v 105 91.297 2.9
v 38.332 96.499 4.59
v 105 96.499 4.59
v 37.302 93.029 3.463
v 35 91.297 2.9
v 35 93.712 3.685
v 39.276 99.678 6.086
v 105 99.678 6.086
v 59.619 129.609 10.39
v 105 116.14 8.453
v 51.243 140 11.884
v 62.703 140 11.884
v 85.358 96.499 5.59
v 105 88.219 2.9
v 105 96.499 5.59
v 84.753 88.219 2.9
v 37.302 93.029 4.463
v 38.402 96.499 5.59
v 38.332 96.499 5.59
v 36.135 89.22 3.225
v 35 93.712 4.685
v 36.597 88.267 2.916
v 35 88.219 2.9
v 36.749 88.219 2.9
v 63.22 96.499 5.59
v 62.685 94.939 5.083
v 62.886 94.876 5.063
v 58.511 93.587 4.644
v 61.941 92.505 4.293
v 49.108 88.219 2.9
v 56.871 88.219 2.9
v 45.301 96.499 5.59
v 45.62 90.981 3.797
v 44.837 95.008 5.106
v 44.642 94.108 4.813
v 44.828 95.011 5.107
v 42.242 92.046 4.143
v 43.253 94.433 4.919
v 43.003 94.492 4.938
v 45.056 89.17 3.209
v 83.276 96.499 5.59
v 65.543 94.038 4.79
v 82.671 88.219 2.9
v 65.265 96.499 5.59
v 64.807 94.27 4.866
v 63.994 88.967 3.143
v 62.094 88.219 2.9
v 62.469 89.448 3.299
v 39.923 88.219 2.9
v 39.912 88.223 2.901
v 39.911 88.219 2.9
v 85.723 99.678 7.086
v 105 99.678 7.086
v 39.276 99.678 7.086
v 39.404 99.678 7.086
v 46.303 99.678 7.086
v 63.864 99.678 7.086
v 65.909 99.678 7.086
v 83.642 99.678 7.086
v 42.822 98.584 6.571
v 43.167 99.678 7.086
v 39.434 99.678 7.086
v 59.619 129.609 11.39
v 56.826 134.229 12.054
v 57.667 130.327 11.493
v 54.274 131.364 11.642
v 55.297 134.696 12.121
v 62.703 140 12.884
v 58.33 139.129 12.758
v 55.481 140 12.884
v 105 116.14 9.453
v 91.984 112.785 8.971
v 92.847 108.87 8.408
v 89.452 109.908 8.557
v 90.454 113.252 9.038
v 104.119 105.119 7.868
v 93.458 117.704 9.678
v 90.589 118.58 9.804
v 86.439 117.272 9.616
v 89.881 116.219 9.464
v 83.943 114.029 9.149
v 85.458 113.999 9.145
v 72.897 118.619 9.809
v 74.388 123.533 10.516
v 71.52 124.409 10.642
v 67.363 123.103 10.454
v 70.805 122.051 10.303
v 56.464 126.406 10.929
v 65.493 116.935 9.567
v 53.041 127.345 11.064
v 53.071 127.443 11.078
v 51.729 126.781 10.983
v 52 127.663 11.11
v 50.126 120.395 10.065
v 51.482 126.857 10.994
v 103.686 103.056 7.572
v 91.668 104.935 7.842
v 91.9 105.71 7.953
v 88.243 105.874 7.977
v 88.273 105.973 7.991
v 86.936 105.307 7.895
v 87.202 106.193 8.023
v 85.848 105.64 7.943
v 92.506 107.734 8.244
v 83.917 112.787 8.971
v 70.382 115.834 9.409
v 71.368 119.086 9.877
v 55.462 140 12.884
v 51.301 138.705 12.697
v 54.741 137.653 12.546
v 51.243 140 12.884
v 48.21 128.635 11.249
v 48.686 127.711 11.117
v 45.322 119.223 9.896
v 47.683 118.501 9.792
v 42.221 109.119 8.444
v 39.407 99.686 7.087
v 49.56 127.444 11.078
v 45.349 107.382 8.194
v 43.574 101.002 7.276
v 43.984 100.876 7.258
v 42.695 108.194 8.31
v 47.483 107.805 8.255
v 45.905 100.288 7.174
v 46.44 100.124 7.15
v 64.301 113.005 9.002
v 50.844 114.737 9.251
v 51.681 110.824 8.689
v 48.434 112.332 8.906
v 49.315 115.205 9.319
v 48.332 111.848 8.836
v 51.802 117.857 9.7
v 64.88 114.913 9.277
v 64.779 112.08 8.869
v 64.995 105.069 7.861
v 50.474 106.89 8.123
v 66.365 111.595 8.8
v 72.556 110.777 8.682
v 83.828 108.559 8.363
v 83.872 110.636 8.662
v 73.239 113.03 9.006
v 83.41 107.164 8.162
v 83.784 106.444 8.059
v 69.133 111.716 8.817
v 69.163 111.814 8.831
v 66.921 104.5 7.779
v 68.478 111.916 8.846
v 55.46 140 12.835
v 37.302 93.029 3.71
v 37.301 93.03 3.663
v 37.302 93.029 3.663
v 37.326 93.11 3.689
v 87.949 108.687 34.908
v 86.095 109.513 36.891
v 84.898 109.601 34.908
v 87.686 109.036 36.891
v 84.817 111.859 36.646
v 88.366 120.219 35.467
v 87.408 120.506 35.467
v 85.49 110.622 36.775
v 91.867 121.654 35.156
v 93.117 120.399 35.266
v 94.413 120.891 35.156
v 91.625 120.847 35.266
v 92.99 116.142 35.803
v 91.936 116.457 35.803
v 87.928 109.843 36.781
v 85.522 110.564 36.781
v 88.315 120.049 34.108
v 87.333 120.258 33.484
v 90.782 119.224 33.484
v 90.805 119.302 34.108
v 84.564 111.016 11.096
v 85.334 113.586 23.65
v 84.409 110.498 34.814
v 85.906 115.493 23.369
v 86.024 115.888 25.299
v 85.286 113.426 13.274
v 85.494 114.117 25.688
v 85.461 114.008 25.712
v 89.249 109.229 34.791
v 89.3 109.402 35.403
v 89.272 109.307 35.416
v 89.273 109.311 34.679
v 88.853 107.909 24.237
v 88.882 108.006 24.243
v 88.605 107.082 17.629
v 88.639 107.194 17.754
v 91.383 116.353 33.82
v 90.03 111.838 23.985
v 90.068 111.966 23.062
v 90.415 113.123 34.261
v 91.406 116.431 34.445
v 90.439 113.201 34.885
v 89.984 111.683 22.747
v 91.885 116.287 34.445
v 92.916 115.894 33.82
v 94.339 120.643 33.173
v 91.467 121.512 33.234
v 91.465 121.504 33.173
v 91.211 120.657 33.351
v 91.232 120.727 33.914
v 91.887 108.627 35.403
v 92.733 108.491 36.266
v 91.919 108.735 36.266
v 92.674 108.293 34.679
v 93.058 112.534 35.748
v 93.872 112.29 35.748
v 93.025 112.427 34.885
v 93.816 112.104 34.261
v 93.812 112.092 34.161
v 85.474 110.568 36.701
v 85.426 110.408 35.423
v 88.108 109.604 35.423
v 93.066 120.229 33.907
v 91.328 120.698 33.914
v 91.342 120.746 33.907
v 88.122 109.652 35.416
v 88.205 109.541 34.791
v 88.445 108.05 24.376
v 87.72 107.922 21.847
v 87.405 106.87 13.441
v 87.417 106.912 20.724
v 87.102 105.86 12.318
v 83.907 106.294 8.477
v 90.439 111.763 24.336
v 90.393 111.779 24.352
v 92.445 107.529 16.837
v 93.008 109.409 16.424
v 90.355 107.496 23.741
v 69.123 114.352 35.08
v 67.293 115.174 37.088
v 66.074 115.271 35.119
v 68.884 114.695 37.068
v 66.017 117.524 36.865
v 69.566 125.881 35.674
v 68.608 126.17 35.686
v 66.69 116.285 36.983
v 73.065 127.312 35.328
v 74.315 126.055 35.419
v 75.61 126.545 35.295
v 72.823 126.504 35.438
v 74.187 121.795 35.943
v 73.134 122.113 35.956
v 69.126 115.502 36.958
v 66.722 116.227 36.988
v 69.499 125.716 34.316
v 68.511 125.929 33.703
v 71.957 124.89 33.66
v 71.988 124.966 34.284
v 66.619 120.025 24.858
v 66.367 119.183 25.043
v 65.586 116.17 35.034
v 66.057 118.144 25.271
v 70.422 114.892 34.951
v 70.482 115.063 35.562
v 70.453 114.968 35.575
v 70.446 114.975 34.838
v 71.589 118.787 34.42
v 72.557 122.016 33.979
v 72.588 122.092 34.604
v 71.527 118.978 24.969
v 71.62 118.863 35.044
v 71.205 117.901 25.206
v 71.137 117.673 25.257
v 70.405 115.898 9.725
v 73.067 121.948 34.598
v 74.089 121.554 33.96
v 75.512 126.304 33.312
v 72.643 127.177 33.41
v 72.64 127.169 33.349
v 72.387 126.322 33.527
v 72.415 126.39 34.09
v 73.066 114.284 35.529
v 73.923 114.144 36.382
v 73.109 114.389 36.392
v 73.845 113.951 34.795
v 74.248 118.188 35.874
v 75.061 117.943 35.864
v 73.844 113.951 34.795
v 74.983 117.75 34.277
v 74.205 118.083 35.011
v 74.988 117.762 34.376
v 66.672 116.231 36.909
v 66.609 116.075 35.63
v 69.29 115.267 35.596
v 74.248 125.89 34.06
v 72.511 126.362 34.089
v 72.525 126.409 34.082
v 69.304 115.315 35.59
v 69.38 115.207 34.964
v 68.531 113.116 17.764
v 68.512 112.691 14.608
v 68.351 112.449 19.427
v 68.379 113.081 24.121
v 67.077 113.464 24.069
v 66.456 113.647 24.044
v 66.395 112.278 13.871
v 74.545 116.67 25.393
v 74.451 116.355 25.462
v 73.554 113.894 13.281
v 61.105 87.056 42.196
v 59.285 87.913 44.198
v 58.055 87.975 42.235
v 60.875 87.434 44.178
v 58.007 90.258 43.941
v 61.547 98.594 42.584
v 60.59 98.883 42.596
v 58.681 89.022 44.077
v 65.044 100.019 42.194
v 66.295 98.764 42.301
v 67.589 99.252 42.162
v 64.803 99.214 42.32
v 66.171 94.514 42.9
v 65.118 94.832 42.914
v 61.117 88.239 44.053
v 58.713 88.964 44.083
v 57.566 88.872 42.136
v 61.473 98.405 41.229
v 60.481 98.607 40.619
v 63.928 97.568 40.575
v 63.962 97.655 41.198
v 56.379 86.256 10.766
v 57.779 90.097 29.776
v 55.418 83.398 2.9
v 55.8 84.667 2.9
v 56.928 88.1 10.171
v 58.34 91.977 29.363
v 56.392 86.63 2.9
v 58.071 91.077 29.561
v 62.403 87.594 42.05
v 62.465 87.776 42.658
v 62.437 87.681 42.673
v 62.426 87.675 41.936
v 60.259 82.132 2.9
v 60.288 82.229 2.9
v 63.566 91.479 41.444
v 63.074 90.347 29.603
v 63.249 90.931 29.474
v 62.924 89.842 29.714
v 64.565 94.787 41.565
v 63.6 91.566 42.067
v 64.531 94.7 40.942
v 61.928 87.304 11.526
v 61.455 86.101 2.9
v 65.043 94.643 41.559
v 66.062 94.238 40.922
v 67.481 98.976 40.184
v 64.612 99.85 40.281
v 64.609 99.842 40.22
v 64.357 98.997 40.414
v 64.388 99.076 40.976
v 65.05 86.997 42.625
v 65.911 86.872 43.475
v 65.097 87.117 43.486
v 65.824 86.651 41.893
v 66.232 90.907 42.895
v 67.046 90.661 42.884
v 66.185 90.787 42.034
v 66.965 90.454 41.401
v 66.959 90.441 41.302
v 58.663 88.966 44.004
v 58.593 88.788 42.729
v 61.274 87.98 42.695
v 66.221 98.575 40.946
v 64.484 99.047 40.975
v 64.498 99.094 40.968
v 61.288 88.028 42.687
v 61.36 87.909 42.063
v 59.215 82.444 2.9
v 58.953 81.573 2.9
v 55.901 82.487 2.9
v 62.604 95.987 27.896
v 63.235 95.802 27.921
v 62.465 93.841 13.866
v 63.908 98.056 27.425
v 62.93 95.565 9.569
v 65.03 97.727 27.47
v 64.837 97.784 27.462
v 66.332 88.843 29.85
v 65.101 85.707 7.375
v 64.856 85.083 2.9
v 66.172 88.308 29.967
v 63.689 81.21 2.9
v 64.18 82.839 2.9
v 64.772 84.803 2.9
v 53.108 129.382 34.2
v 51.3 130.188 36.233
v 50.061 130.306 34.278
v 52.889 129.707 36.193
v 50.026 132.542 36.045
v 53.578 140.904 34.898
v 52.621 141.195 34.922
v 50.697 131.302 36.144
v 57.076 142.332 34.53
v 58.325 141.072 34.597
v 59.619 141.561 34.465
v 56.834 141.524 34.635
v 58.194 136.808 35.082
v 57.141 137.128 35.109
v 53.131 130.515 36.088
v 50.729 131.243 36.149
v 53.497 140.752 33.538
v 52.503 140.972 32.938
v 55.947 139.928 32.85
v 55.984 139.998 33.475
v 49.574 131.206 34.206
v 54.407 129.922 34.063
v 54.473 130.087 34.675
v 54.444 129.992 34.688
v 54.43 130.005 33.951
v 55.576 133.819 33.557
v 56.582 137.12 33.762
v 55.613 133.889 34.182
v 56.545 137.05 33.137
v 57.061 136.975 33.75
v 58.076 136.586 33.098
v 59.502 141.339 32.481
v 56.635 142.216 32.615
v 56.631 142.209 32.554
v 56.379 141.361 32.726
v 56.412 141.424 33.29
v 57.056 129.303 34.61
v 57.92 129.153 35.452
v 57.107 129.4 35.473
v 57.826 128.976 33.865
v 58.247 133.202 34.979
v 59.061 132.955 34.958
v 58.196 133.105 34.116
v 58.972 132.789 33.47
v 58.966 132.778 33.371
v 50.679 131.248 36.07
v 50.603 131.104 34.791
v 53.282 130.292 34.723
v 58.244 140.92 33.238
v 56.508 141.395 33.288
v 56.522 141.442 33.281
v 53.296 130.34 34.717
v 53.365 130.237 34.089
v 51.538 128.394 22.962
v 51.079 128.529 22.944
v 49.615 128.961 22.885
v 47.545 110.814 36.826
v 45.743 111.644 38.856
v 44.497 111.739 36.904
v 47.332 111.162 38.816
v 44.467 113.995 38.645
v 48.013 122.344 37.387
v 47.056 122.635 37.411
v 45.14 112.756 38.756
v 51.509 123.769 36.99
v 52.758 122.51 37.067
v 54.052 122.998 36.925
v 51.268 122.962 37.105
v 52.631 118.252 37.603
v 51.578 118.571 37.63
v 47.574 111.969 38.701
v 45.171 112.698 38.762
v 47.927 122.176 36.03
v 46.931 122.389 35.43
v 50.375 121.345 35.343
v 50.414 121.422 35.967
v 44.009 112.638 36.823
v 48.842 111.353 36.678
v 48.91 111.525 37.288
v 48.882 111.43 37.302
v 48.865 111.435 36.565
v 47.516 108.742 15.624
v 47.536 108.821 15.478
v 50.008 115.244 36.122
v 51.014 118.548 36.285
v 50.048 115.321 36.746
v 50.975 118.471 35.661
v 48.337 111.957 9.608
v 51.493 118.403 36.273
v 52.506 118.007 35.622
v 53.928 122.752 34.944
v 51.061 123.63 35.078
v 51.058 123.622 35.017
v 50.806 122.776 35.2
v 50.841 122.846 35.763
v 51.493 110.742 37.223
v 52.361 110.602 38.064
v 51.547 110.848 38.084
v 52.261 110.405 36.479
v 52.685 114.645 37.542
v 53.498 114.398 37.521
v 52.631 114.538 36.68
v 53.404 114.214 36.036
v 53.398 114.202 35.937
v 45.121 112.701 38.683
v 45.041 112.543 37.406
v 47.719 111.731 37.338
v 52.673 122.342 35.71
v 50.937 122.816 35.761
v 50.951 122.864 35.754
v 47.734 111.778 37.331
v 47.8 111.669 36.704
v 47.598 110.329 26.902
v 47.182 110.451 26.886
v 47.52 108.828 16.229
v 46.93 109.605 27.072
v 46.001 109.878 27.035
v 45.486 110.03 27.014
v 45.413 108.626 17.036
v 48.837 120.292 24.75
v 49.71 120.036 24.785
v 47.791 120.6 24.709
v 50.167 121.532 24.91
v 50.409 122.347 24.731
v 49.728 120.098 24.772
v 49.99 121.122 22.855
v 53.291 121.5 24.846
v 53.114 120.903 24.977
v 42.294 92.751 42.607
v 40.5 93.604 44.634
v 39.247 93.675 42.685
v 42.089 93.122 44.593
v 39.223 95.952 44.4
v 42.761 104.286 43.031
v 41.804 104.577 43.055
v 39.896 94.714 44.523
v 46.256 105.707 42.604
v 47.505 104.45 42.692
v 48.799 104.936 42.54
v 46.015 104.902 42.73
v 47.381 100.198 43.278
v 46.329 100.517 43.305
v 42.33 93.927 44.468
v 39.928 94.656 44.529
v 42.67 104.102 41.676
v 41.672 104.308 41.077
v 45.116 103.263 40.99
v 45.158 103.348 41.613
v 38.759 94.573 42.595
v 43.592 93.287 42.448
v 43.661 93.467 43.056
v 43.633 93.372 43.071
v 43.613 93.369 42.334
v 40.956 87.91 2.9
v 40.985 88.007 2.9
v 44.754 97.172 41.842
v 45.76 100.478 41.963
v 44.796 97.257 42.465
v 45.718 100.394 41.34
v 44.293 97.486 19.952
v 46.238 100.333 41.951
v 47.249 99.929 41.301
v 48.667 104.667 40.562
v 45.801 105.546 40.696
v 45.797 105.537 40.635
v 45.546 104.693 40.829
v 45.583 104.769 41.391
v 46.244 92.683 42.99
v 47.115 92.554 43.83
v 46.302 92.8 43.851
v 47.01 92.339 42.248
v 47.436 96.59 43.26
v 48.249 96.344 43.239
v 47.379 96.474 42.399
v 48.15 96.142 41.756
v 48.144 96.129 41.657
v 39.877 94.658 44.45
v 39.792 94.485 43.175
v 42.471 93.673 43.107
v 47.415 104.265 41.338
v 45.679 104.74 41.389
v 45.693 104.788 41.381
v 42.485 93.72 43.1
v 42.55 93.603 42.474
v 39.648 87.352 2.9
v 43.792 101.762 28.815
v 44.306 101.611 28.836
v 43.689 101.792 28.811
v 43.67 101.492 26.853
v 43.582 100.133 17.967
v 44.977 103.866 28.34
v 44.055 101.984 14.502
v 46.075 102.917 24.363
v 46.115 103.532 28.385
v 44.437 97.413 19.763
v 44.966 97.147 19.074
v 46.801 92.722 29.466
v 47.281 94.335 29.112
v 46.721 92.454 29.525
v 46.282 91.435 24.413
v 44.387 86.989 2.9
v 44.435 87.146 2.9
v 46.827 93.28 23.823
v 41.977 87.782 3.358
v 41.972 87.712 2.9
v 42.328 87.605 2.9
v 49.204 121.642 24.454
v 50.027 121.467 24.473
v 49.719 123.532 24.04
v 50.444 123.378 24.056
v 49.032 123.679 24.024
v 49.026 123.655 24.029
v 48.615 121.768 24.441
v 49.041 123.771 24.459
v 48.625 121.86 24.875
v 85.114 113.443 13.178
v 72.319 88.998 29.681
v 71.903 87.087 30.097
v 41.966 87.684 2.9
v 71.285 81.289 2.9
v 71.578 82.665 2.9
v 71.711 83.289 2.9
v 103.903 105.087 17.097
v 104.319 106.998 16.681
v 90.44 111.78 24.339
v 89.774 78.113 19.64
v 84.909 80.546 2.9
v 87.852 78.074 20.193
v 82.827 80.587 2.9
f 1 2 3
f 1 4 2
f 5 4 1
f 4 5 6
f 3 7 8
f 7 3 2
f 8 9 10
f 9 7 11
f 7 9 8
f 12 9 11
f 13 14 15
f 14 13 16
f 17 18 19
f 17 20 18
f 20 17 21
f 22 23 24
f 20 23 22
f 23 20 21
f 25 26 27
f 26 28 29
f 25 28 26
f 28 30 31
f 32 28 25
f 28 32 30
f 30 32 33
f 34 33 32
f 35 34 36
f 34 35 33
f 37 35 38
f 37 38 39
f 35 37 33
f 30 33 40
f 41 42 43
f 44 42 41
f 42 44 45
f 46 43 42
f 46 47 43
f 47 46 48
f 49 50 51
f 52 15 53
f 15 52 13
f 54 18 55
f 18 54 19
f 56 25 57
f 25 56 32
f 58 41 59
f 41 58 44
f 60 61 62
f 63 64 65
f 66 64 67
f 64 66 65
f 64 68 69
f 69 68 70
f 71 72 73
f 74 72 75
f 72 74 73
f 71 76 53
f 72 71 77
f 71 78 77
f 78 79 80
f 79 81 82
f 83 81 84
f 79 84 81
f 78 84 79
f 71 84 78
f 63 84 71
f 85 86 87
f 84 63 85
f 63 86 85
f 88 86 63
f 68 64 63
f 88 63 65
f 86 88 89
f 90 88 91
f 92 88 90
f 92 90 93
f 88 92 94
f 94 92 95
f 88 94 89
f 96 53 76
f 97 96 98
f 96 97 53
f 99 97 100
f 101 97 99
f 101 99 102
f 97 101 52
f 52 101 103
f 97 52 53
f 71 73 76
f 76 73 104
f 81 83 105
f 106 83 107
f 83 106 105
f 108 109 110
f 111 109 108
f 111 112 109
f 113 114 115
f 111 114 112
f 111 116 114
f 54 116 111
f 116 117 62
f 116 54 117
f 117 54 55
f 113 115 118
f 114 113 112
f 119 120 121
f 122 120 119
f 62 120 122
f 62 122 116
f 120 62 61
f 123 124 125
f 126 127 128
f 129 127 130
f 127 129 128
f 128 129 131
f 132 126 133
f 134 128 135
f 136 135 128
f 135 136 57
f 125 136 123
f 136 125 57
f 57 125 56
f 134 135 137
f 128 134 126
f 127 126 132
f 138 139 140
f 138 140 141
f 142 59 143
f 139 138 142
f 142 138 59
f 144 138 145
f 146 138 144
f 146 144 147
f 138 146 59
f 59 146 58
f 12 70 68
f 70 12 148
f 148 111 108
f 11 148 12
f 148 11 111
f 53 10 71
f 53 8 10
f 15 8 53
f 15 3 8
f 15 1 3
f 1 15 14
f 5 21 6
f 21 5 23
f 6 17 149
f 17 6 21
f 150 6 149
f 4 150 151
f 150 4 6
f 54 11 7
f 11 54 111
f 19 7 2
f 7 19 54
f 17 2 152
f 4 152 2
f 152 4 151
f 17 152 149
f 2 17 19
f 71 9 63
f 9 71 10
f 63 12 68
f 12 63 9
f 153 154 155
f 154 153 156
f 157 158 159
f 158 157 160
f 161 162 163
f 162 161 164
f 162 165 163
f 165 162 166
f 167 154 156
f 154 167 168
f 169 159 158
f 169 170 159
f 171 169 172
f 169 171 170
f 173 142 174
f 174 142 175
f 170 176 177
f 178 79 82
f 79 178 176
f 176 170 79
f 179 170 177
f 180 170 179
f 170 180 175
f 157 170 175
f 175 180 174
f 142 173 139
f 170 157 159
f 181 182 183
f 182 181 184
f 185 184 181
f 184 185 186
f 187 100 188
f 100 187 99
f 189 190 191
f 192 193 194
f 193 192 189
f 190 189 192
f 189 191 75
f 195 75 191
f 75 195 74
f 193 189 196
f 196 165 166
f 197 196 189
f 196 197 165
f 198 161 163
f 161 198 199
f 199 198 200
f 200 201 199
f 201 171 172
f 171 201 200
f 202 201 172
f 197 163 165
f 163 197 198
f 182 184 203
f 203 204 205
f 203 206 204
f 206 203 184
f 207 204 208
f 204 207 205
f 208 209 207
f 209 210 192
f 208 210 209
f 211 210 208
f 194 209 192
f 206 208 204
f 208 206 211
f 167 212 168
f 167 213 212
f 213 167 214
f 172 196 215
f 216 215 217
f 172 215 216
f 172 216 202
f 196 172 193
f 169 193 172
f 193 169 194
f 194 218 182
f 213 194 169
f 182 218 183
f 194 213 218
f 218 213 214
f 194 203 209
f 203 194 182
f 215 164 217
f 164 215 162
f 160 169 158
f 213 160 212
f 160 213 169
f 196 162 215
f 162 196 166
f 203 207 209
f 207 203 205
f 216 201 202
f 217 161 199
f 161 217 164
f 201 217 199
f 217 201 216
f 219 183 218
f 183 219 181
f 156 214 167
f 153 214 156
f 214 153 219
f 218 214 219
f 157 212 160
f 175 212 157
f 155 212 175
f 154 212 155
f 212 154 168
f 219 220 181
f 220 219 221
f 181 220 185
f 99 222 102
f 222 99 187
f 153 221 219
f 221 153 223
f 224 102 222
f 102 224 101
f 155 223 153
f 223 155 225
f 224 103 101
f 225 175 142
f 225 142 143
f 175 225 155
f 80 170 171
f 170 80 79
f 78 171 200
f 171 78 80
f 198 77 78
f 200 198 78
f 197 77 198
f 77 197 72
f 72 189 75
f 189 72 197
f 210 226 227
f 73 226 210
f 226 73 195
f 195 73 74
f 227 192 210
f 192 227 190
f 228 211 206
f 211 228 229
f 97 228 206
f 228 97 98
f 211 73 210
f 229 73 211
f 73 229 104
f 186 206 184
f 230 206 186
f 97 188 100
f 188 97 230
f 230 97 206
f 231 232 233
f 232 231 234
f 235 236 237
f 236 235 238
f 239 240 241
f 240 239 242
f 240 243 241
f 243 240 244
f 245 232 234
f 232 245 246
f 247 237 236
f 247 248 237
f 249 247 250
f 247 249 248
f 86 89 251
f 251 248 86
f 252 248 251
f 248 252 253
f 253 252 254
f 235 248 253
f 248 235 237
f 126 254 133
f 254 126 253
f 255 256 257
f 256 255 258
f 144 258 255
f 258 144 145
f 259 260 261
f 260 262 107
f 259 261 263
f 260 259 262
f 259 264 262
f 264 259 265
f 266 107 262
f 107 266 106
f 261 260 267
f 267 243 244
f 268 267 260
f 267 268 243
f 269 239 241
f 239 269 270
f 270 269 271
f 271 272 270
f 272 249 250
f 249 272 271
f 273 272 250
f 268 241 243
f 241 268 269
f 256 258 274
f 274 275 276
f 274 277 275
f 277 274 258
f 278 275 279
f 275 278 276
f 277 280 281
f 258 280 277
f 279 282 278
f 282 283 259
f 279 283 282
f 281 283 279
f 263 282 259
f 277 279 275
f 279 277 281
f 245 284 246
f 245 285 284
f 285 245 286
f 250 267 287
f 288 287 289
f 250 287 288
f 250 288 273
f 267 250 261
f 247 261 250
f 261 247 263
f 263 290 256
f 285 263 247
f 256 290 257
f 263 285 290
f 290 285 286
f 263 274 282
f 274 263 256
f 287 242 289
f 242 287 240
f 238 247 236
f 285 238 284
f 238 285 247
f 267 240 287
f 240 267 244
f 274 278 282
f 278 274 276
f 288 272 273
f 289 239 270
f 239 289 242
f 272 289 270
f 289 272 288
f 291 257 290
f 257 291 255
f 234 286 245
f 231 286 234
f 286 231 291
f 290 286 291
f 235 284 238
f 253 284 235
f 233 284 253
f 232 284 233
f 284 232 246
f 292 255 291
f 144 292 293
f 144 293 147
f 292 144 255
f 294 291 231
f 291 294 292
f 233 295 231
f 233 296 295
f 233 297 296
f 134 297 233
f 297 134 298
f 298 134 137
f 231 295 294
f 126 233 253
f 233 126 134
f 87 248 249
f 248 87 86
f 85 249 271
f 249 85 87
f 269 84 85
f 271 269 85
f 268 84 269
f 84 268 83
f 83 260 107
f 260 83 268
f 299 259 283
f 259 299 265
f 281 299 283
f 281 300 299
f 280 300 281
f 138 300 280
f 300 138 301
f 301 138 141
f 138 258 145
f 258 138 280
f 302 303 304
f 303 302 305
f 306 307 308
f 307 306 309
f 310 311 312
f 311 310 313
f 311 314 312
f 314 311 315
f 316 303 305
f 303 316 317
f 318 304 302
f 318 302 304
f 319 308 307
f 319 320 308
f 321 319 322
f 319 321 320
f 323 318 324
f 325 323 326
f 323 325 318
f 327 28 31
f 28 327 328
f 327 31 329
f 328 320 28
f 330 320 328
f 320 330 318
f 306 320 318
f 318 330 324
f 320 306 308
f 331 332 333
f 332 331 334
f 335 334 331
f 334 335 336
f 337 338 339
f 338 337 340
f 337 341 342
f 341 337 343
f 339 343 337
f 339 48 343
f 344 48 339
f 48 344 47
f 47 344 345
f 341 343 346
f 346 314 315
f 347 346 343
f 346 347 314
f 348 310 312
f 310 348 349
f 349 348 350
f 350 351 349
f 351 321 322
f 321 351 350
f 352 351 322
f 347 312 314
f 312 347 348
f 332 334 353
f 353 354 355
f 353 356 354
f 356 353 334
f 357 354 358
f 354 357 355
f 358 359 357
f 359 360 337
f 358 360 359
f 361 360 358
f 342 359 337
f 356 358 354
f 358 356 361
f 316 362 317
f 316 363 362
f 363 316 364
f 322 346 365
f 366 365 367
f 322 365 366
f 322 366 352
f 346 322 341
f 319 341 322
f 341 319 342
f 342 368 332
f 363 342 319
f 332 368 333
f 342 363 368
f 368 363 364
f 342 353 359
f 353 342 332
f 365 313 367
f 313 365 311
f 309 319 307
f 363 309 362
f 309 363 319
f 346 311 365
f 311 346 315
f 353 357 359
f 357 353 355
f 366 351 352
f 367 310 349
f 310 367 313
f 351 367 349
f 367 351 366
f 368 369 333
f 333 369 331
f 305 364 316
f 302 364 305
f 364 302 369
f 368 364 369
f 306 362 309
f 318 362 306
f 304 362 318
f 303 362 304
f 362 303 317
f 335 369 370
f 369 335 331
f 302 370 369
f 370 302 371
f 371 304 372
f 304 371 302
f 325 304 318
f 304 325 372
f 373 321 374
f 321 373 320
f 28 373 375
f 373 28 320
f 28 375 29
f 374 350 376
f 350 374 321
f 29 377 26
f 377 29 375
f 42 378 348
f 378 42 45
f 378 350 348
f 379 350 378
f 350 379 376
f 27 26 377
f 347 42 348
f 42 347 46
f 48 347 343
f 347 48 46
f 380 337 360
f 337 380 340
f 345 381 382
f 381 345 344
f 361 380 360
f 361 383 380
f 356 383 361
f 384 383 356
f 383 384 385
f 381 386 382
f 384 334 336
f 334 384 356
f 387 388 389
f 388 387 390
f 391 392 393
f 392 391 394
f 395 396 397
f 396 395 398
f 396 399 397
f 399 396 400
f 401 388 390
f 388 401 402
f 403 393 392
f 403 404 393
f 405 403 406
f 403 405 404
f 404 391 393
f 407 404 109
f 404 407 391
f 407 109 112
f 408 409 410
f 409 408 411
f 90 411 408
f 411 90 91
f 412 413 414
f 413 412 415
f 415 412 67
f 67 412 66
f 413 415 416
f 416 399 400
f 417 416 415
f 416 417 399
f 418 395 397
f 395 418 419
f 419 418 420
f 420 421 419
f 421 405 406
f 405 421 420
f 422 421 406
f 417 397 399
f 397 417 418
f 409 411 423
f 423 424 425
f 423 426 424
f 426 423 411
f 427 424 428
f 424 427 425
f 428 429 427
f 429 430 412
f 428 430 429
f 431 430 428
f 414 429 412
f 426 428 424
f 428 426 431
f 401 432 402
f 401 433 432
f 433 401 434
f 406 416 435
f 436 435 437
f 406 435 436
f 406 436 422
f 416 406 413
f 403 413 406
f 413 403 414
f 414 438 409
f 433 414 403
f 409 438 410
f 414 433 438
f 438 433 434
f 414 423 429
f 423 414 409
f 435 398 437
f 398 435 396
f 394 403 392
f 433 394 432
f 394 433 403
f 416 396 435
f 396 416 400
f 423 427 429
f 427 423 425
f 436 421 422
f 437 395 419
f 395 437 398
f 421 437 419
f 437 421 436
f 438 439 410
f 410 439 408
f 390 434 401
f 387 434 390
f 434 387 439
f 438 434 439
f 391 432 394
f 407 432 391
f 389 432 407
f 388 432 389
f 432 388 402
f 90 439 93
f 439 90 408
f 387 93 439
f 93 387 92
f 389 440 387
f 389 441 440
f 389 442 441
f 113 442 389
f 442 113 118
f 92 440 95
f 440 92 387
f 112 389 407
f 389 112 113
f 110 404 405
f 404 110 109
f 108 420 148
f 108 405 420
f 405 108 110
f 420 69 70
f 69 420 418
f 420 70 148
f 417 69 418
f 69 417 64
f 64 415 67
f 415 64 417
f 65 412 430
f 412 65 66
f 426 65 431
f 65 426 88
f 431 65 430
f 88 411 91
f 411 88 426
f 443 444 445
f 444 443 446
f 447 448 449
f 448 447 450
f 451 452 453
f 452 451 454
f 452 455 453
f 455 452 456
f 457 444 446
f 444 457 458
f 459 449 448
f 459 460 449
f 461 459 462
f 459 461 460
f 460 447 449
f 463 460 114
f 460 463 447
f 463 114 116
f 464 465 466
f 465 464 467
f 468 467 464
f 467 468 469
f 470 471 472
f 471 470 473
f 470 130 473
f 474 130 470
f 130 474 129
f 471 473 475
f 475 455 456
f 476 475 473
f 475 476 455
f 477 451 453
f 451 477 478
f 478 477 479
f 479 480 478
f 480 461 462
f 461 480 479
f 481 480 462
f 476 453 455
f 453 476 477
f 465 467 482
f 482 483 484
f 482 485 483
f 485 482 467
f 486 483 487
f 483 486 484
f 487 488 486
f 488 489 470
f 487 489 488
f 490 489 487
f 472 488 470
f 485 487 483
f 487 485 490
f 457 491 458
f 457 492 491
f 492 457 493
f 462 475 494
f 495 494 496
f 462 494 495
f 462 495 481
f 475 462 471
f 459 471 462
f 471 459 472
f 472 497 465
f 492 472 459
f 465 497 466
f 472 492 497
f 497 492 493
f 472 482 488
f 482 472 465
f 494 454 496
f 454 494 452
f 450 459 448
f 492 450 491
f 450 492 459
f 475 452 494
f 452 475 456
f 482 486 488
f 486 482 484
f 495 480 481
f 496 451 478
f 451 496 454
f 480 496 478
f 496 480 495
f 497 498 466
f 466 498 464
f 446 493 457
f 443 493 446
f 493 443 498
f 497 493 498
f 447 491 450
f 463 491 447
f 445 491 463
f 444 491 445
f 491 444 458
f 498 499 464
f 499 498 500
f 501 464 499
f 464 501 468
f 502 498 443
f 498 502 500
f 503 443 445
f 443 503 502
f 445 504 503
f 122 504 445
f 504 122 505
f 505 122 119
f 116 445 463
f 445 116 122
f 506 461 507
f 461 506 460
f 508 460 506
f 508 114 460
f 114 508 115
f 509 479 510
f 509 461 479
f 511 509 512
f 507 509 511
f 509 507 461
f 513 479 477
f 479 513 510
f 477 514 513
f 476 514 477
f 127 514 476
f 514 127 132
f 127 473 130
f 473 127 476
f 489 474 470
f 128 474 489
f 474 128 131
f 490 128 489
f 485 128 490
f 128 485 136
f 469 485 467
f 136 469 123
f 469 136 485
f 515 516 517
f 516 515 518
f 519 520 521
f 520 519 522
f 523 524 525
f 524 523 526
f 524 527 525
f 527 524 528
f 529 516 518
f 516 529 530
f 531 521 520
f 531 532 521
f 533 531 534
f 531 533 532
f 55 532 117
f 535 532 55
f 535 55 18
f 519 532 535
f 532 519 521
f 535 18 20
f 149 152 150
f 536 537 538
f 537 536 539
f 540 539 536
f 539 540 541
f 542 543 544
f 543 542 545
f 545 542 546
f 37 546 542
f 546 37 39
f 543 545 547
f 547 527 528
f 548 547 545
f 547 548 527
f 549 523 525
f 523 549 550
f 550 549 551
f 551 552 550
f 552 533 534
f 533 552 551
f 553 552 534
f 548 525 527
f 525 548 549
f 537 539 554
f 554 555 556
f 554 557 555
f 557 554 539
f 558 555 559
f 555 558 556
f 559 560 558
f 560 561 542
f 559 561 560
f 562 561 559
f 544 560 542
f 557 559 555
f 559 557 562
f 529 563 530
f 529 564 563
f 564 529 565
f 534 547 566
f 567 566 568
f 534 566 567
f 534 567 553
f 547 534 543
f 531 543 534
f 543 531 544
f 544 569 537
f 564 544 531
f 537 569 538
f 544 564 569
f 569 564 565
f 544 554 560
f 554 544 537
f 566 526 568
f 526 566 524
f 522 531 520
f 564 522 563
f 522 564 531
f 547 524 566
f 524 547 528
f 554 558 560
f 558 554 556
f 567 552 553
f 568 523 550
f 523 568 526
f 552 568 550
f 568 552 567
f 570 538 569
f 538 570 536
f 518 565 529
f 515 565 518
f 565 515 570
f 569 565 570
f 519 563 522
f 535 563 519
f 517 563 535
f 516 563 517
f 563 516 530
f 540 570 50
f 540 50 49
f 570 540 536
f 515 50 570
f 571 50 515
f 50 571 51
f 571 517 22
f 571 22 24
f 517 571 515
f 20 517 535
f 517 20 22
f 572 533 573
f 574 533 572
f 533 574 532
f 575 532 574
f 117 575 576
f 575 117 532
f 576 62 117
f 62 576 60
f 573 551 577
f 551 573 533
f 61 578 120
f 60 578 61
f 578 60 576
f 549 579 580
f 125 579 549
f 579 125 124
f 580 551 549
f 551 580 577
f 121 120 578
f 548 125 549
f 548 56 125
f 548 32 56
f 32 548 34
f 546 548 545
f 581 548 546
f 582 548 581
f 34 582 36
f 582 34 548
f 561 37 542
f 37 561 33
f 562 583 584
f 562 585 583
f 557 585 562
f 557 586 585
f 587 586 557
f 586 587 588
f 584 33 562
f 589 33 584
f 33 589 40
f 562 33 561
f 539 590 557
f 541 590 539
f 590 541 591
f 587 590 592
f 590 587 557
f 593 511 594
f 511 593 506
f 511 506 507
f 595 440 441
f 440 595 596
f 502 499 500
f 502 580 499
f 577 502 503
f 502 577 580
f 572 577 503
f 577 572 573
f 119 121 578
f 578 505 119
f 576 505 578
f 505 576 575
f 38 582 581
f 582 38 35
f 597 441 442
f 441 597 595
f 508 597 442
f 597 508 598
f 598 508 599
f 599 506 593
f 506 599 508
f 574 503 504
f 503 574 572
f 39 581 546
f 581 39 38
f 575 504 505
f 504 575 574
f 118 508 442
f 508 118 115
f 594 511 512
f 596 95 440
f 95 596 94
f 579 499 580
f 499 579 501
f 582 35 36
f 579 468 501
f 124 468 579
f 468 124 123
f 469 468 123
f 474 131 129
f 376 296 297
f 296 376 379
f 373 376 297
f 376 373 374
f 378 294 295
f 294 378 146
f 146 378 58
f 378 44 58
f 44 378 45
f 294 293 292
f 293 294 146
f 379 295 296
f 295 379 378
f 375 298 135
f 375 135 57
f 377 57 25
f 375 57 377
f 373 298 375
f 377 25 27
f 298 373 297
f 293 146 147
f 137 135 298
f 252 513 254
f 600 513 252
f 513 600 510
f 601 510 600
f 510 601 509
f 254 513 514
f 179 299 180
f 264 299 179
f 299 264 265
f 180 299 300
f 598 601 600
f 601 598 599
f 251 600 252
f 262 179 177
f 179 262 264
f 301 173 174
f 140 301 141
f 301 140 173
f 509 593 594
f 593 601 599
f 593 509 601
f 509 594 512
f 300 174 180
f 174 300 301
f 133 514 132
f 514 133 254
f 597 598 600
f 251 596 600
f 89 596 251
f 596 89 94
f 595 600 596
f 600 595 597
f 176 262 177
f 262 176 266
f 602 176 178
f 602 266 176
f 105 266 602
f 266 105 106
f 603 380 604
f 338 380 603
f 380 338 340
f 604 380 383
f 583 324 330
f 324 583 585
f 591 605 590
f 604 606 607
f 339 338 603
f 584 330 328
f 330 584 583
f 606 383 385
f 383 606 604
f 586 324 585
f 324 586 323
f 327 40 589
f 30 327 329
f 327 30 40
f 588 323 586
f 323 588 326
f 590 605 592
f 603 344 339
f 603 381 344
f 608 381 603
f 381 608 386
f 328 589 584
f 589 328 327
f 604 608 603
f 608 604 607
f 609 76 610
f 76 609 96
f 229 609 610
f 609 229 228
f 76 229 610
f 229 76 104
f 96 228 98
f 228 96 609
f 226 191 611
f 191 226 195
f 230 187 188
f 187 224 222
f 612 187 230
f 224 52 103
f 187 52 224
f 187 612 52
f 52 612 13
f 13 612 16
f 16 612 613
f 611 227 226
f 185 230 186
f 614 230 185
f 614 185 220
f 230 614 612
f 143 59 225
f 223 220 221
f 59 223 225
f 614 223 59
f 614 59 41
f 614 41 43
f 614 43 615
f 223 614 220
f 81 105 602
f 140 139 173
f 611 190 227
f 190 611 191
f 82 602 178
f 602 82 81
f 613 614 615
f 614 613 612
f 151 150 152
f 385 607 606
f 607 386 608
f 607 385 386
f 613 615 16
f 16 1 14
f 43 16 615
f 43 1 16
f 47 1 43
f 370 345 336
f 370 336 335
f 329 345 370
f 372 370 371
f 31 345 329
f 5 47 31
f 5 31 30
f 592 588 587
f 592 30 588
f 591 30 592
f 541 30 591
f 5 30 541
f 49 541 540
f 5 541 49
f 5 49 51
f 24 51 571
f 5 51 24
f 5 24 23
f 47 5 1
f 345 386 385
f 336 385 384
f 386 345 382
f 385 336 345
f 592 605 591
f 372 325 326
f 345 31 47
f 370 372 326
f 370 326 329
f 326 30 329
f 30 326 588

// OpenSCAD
difference () {
  union () {
    difference () {
      translate ([0, 0, 0.2]) {
        union () {
          difference () {
            translate ([0, 63, 89]) {
              rotate (a=90.0, v=[0, 1, 0]) {
                cylinder ($fn=50, h=416, r=91, center=true);
              }
            }
            intersection () {
              difference () {
                translate ([0, 63, 89]) {
                  rotate (a=90.0, v=[0, 1, 0]) {
                    cylinder ($fn=50, h=416, r=91, center=true);
                  }
                }
                translate ([0, 63, 89]) {
                  rotate (a=90.0, v=[0, 1, 0]) {
                    cylinder ($fn=50, h=416, r=90, center=true);
                  }
                }
              }
              translate ([195.25, 6, 22]) {
                cube ([26, 18, 31], center=true);
              }
            }
            translate ([0, 16, -70]) {
              rotate (a=90.0, v=[1, 0, 0]) {
                cylinder ($fn=50, h=32, r=112, center=true);
              }
            }
            translate ([203, 8, 9.8]) {
              cylinder (h=25, r=5.8, center=true);
            }
            translate ([0, 93, 0.5]) {
              cube ([416, 186, 2], center=true);
            }
            translate ([0, 1, 35]) {
              cube ([416, 2, 70], center=true);
            }
          }
          translate ([0, 130, 25.4]) {
            rotate (a=8.181818181818182, v=[1, 0, 0]) {
              cube ([416, 110, 30], center=true);
            }
          }
        }
      }
      translate ([0, 0, 1.2]) {
        union () {
          difference () {
            translate ([0, 63, 89]) {
              rotate (a=90.0, v=[0, 1, 0]) {
                cylinder ($fn=50, h=416, r=91, center=true);
              }
            }
            intersection () {
              difference () {
                translate ([0, 63, 89]) {
                  rotate (a=90.0, v=[0, 1, 0]) {
                    cylinder ($fn=50, h=416, r=91, center=true);
                  }
                }
                translate ([0, 63, 89]) {
                  rotate (a=90.0, v=[0, 1, 0]) {
                    cylinder ($fn=50, h=416, r=90, center=true);
                  }
                }
              }
              translate ([195.25, 6, 22]) {
                cube ([26, 18, 31], center=true);
              }
            }
            translate ([0, 16, -70]) {
              rotate (a=90.0, v=[1, 0, 0]) {
                cylinder ($fn=50, h=32, r=112, center=true);
              }
            }
            translate ([203, 8, 9.8]) {
              cylinder (h=25, r=5.8, center=true);
            }
            translate ([0, 93, 0.5]) {
              cube ([416, 186, 2], center=true);
            }
            translate ([0, 1, 35]) {
              cube ([416, 2, 70], center=true);
            }
          }
          translate ([0, 130, 25.4]) {
            rotate (a=8.181818181818182, v=[1, 0, 0]) {
              cube ([416, 110, 30], center=true);
            }
          }
        }
      }
      translate ([50, 0, 0]) {
        cube ([600, 150, 300], center=true);
      }
      translate ([50, 215, 0]) {
        cube ([600, 150, 300], center=true);
      }
      translate ([165, 100, 0]) {
        cube ([120, 200, 300], center=true);
      }
      translate ([-125, 100, 0]) {
        cube ([320, 200, 300], center=true);
      }
      translate ([50, 140, 50]) {
        cube ([30, 30, 30], center=true);
      }
      translate ([0, 0, -14]) {
        cube ([500, 500, 30], center=true);
      }
      translate ([37.21, 124.35, 28]) {
        rotate (a=73.46938775510203, v=[0, 0, 1]) {
          cube ([60, 18, 50], center=true);
        }
      }
      translate ([87, 134, 28]) {
        rotate (a=73.46938775510203, v=[0, 0, 1]) {
          cube ([24, 50, 50], center=true);
        }
      }
    }
    intersection () {
      union () {
        translate ([125, 58, 0]) {
          mirror ([0, 1, 0]) {
            rotate (a=3.0, v=[0, 1, 0]) {
              union () {
                translate ([-52, -53, 37]) {
                  rotate (a=7.499999999999999, v=[1, -0.1, 0]) {
                    rotate (a=16.875, v=[0, 0, 1]) {
                      translate ([17.4, 0, 0]) {
                        translate ([0, 0, 1597.5641385291783]) {
                          rotate (a=0.0, v=[0, 1, 0]) {
                            translate ([0, 0, -1597.5641385291783]) {
                              translate ([0, 0, 1516.0762963369527]) {
                                rotate (a=-0.3515625, v=[1, 0, 0]) {
                                  translate ([0, 0, -1516.0762963369527]) {
                                    rotate (a=90.0, v=[0, 0, 1]) {
                                      union () {
                                        difference () {
                                          union () {
                                            translate ([1.7, 5.75, -3.5]) {
                                              cube ([11, 5, 2], center=true);
                                            }
                                            translate ([-3.7, 3.15, -3.5]) {
                                              cube ([5, 3, 2], center=true);
                                            }
                                            translate ([4.2, 2.2, -3.8]) {
                                              cube ([4, 5, 1.6], center=true);
                                            }
                                          }
                                          union () {
                                            translate ([0.5, 5, -3.12]) {
                                              cube ([11.7, 4.5, 1.5], center=true);
                                            }
                                            translate ([4.2, 2.8, -3.12]) {
                                              cube ([4, 4.5, 1.5], center=true);
                                            }
                                          }
                                          translate ([-6.3, 5.5, -3.5]) {
                                            rotate (a=10.0, v=[1, 0, 0]) {
                                              cube ([2, 2, 10], center=true);
                                            }
                                          }
                                          translate ([7.3, 3.5, -3.5]) {
                                            rotate (a=10.0, v=[-1, 0, 0]) {
                                              cube ([2, 2, 10], center=true);
                                            }
                                          }
                                          translate ([8.1, 9.1, -3.5]) {
                                            rotate (a=22.5, v=[1, -1, 0]) {
                                              rotate (a=45.0, v=[0, 0, 1]) {
                                                cube ([4, 4, 10], center=true);
                                              }
                                            }
                                          }
                                        }
                                        translate ([0, 0, -54.5]) {
                                          linear_extrude (height=100, center=true){
                                            projection (cut = false) {
                                              difference () {
                                                union () {
                                                  translate ([1.7, 5.75, -3.5]) {
                                                    cube ([11, 5, 2], center=true);
                                                  }
                                                  translate ([-3.7, 3.15, -3.5]) {
                                                    cube ([5, 3, 2], center=true);
                                                  }
                                                  translate ([4.2, 2.2, -3.8]) {
                                                    cube ([4, 5, 1.6], center=true);
                                                  }
                                                }
                                                union () {
                                                  translate ([0.5, 5, -3.12]) {
                                                    cube ([11.7, 4.5, 1.5], center=true);
                                                  }
                                                  translate ([4.2, 2.8, -3.12]) {
                                                    cube ([4, 4.5, 1.5], center=true);
                                                  }
                                                }
                                                translate ([-6.3, 5.5, -3.5]) {
                                                  rotate (a=10.0, v=[1, 0, 0]) {
                                                    cube ([2, 2, 10], center=true);
                                                  }
                                                }
                                                translate ([7.3, 3.5, -3.5]) {
                                                  rotate (a=10.0, v=[-1, 0, 0]) {
                                                    cube ([2, 2, 10], center=true);
                                                  }
                                                }
                                                translate ([8.1, 9.1, -3.5]) {
                                                  rotate (a=22.5, v=[1, -1, 0]) {
                                                    rotate (a=45.0, v=[0, 0, 1]) {
                                                      cube ([4, 4, 10], center=true);
                                                    }
                                                  }
                                                }
                                              }
                                            }
                                          }
                                        }
                                      }
                                    }
                                  }
                                }
                              }
                            }
                          }
                        }
                      }
                    }
                  }
                }
                translate ([-52, -53, 37]) {
                  rotate (a=7.499999999999999, v=[1, -0.1, 0]) {
                    rotate (a=16.875, v=[0, 0, 1]) {
                      translate ([17.4, 0, 0]) {
                        translate ([0, 0, 1597.5641385291783]) {
                          rotate (a=0.703125, v=[0, 1, 0]) {
                            translate ([0, 0, -1597.5641385291783]) {
                              translate ([0, 0, 1516.0762963369527]) {
                                rotate (a=-0.3515625, v=[1, 0, 0]) {
                                  translate ([0, 0, -1516.0762963369527]) {
                                    rotate (a=90.0, v=[0, 0, 1]) {
                                      union () {
                                        difference () {
                                          union () {
                                            translate ([1.7, 5.75, -3.5]) {
                                              cube ([11, 5, 2], center=true);
                                            }
                                            translate ([-3.7, 3.15, -3.5]) {
                                              cube ([5, 3, 2], center=true);
                                            }
                                            translate ([4.2, 2.2, -3.8]) {
                                              cube ([4, 5, 1.6], center=true);
                                            }
                                          }
                                          union () {
                                            translate ([0.5, 5, -3.12]) {
                                              cube ([11.7, 4.5, 1.5], center=true);
                                            }
                                            translate ([4.2, 2.8, -3.12]) {
                                              cube ([4, 4.5, 1.5], center=true);
                                            }
                                          }
                                          translate ([-6.3, 5.5, -3.5]) {
                                            rotate (a=10.0, v=[1, 0, 0]) {
                                              cube ([2, 2, 10], center=true);
                                            }
                                          }
                                          translate ([7.3, 3.5, -3.5]) {
                                            rotate (a=10.0, v=[-1, 0, 0]) {
                                              cube ([2, 2, 10], center=true);
                                            }
                                          }
                                          translate ([8.1, 9.1, -3.5]) {
                                            rotate (a=22.5, v=[1, -1, 0]) {
                                              rotate (a=45.0, v=[0, 0, 1]) {
                                                cube ([4, 4, 10], center=true);
                                              }
                                            }
                                          }
                                        }
                                        translate ([0, 0, -54.5]) {
                                          linear_extrude (height=100, center=true){
                                            projection (cut = false) {
                                              difference () {
                                                union () {
                                                  translate ([1.7, 5.75, -3.5]) {
                                                    cube ([11, 5, 2], center=true);
                                                  }
                                                  translate ([-3.7, 3.15, -3.5]) {
                                                    cube ([5, 3, 2], center=true);
                                                  }
                                                  translate ([4.2, 2.2, -3.8]) {
                                                    cube ([4, 5, 1.6], center=true);
                                                  }
                                                }
                                                union () {
                                                  translate ([0.5, 5, -3.12]) {
                                                    cube ([11.7, 4.5, 1.5], center=true);
                                                  }
                                                  translate ([4.2, 2.8, -3.12]) {
                                                    cube ([4, 4.5, 1.5], center=true);
                                                  }
                                                }
                                                translate ([-6.3, 5.5, -3.5]) {
                                                  rotate (a=10.0, v=[1, 0, 0]) {
                                                    cube ([2, 2, 10], center=true);
                                                  }
                                                }
                                                translate ([7.3, 3.5, -3.5]) {
                                                  rotate (a=10.0, v=[-1, 0, 0]) {
                                                    cube ([2, 2, 10], center=true);
                                                  }
                                                }
                                                translate ([8.1, 9.1, -3.5]) {
                                                  rotate (a=22.5, v=[1, -1, 0]) {
                                                    rotate (a=45.0, v=[0, 0, 1]) {
                                                      cube ([4, 4, 10], center=true);
                                                    }
                                                  }
                                                }
                                              }
                                            }
                                          }
                                        }
                                      }
                                    }
                                  }
                                }
                              }
                            }
                          }
                        }
                      }
                    }
                  }
                }
                translate ([-52, -53, 40]) {
                  rotate (a=7.499999999999999, v=[1, -0.1, 0]) {
                    rotate (a=16.875, v=[0, 0, 1]) {
                      translate ([17.4, 0, 0]) {
                        translate ([0, 0.8, 1597.5641385291783]) {
                          rotate (a=0.703125, v=[0, 1, 0]) {
                            translate ([0, 0, -1597.5641385291783]) {
                              translate ([0, 0, 1516.0762963369527]) {
                                rotate (a=0.703125, v=[1, 0, 0]) {
                                  translate ([0, 0, -1516.0762963369527]) {
                                    rotate (a=90.0, v=[0, 0, 1]) {
                                      union () {
                                        difference () {
                                          union () {
                                            translate ([1.7, 5.75, -3.5]) {
                                              cube ([11, 5, 2], center=true);
                                            }
                                            translate ([-3.7, 3.15, -3.5]) {
                                              cube ([5, 3, 2], center=true);
                                            }
                                            translate ([4.2, 2.2, -3.8]) {
                                              cube ([4, 5, 1.6], center=true);
                                            }
                                          }
                                          union () {
                                            translate ([0.5, 5, -3.12]) {
                                              cube ([11.7, 4.5, 1.5], center=true);
                                            }
                                            translate ([4.2, 2.8, -3.12]) {
                                              cube ([4, 4.5, 1.5], center=true);
                                            }
                                          }
                                          translate ([-6.3, 5.5, -3.5]) {
                                            rotate (a=10.0, v=[1, 0, 0]) {
                                              cube ([2, 2, 10], center=true);
                                            }
                                          }
                                          translate ([7.3, 3.5, -3.5]) {
                                            rotate (a=10.0, v=[-1, 0, 0]) {
                                              cube ([2, 2, 10], center=true);
                                            }
                                          }
                                          translate ([8.1, 9.1, -3.5]) {
                                            rotate (a=22.5, v=[1, -1, 0]) {
                                              rotate (a=45.0, v=[0, 0, 1]) {
                                                cube ([4, 4, 10], center=true);
                                              }
                                            }
                                          }
                                        }
                                        translate ([0, 0, -54.5]) {
                                          linear_extrude (height=100, center=true){
                                            projection (cut = false) {
                                              difference () {
                                                union () {
                                                  translate ([1.7, 5.75, -3.5]) {
                                                    cube ([11, 5, 2], center=true);
                                                  }
                                                  translate ([-3.7, 3.15, -3.5]) {
                                                    cube ([5, 3, 2], center=true);
                                                  }
                                                  translate ([4.2, 2.2, -3.8]) {
                                                    cube ([4, 5, 1.6], center=true);
                                                  }
                                                }
                                                union () {
                                                  translate ([0.5, 5, -3.12]) {
                                                    cube ([11.7, 4.5, 1.5], center=true);
                                                  }
                                                  translate ([4.2, 2.8, -3.12]) {
                                                    cube ([4, 4.5, 1.5], center=true);
                                                  }
                                                }
                                                translate ([-6.3, 5.5, -3.5]) {
                                                  rotate (a=10.0, v=[1, 0, 0]) {
                                                    cube ([2, 2, 10], center=true);
                                                  }
                                                }
                                                translate ([7.3, 3.5, -3.5]) {
                                                  rotate (a=10.0, v=[-1, 0, 0]) {
                                                    cube ([2, 2, 10], center=true);
                                                  }
                                                }
                                                translate ([8.1, 9.1, -3.5]) {
                                                  rotate (a=22.5, v=[1, -1, 0]) {
                                                    rotate (a=45.0, v=[0, 0, 1]) {
                                                      cube ([4, 4, 10], center=true);
                                                    }
                                                  }
                                                }
                                              }
                                            }
                                          }
                                        }
                                      }
                                    }
                                  }
                                }
                              }
                            }
                          }
                        }
                      }
                    }
                  }
                }
                union () {
                  translate ([-52, -53, 37]) {
                    rotate (a=7.499999999999999, v=[1, -0.1, 0]) {
                      rotate (a=16.875, v=[0, 0, 1]) {
                        translate ([17.4, 0, 0]) {
                          translate ([0, -0.5, 1597.5641385291783]) {
                            rotate (a=1.40625, v=[0, 1, 0]) {
                              translate ([0, 0, -1597.5641385291783]) {
                                translate ([0, 0, 1516.0762963369527]) {
                                  rotate (a=-0.703125, v=[1, 0, 0]) {
                                    translate ([0, 0, -1516.0762963369527]) {
                                      rotate (a=90.0, v=[0, 0, 1]) {
                                        union () {
                                          difference () {
                                            union () {
                                              translate ([1.7, 5.75, -3.5]) {
                                                cube ([11, 5, 2], center=true);
                                              }
                                              translate ([-3.7, 3.15, -3.5]) {
                                                cube ([5, 3, 2], center=true);
                                              }
                                              translate ([4.2, 2.2, -3.8]) {
                                                cube ([4, 5, 1.6], center=true);
                                              }
                                            }
                                            union () {
                                              translate ([0.5, 5, -3.12]) {
                                                cube ([11.7, 4.5, 1.5], center=true);
                                              }
                                              translate ([4.2, 2.8, -3.12]) {
                                                cube ([4, 4.5, 1.5], center=true);
                                              }
                                            }
                                            translate ([-6.3, 5.5, -3.5]) {
                                              rotate (a=10.0, v=[1, 0, 0]) {
                                                cube ([2, 2, 10], center=true);
                                              }
                                            }
                                            translate ([7.3, 3.5, -3.5]) {
                                              rotate (a=10.0, v=[-1, 0, 0]) {
                                                cube ([2, 2, 10], center=true);
                                              }
                                            }
                                            translate ([8.1, 9.1, -3.5]) {
                                              rotate (a=22.5, v=[1, -1, 0]) {
                                                rotate (a=45.0, v=[0, 0, 1]) {
                                                  cube ([4, 4, 10], center=true);
                                                }
                                              }
                                            }
                                          }
                                          translate ([0, 0, -54.5]) {
                                            linear_extrude (height=100, center=true){
                                              projection (cut = false) {
                                                difference () {
                                                  union () {
                                                    translate ([1.7, 5.75, -3.5]) {
                                                      cube ([11, 5, 2], center=true);
                                                    }
                                                    translate ([-3.7, 3.15, -3.5]) {
                                                      cube ([5, 3, 2], center=true);
                                                    }
                                                    translate ([4.2, 2.2, -3.8]) {
                                                      cube ([4, 5, 1.6], center=true);
                                                    }
                                                  }
                                                  union () {
                                                    translate ([0.5, 5, -3.12]) {
                                                      cube ([11.7, 4.5, 1.5], center=true);
                                                    }
                                                    translate ([4.2, 2.8, -3.12]) {
                                                      cube ([4, 4.5, 1.5], center=true);
                                                    }
                                                  }
                                                  translate ([-6.3, 5.5, -3.5]) {
                                                    rotate (a=10.0, v=[1, 0, 0]) {
                                                      cube ([2, 2, 10], center=true);
                                                    }
                                                  }
                                                  translate ([7.3, 3.5, -3.5]) {
                                                    rotate (a=10.0, v=[-1, 0, 0]) {
                                                      cube ([2, 2, 10], center=true);
                                                    }
                                                  }
                                                  translate ([8.1, 9.1, -3.5]) {
                                                    rotate (a=22.5, v=[1, -1, 0]) {
                                                      rotate (a=45.0, v=[0, 0, 1]) {
                                                        cube ([4, 4, 10], center=true);
                                                      }
                                                    }
                                                  }
                                                }
                                              }
                                            }
                                          }
                                        }
                                      }
                                    }
                                  }
                                }
                              }
                            }
                          }
                        }
                      }
                    }
                  }
                  translate ([-52, -53, 37]) {
                    rotate (a=7.499999999999999, v=[1, -0.1, 0]) {
                      rotate (a=16.875, v=[0, 0, 1]) {
                        translate ([17.4, 0, 0]) {
                          translate ([0, 0.4, 1597.5641385291783]) {
                            rotate (a=1.40625, v=[0, 1, 0]) {
                              translate ([0, 0, -1597.5641385291783]) {
                                translate ([0, 0, 1516.0762963369527]) {
                                  rotate (a=0.0, v=[1, 0, 0]) {
                                    translate ([0, 0, -1516.0762963369527]) {
                                      rotate (a=90.0, v=[0, 0, 1]) {
                                        union () {
                                          difference () {
                                            union () {
                                              translate ([1.7, 5.75, -3.5]) {
                                                cube ([11, 5, 2], center=true);
                                              }
                                              translate ([-3.7, 3.15, -3.5]) {
                                                cube ([5, 3, 2], center=true);
                                              }
                                              translate ([4.2, 2.2, -3.8]) {
                                                cube ([4, 5, 1.6], center=true);
                                              }
                                            }
                                            union () {
                                              translate ([0.5, 5, -3.12]) {
                                                cube ([11.7, 4.5, 1.5], center=true);
                                              }
                                              translate ([4.2, 2.8, -3.12]) {
                                                cube ([4, 4.5, 1.5], center=true);
                                              }
                                            }
                                            translate ([-6.3, 5.5, -3.5]) {
                                              rotate (a=10.0, v=[1, 0, 0]) {
                                                cube ([2, 2, 10], center=true);
                                              }
                                            }
                                            translate ([7.3, 3.5, -3.5]) {
                                              rotate (a=10.0, v=[-1, 0, 0]) {
                                                cube ([2, 2, 10], center=true);
                                              }
                                            }
                                            translate ([8.1, 9.1, -3.5]) {
                                              rotate (a=22.5, v=[1, -1, 0]) {
                                                rotate (a=45.0, v=[0, 0, 1]) {
                                                  cube ([4, 4, 10], center=true);
                                                }
                                              }
                                            }
                                          }
                                          translate ([0, 0, -54.5]) {
                                            linear_extrude (height=100, center=true){
                                              projection (cut = false) {
                                                difference () {
                                                  union () {
                                                    translate ([1.7, 5.75, -3.5]) {
                                                      cube ([11, 5, 2], center=true);
                                                    }
                                                    translate ([-3.7, 3.15, -3.5]) {
                                                      cube ([5, 3, 2], center=true);
                                                    }
                                                    translate ([4.2, 2.2, -3.8]) {
                                                      cube ([4, 5, 1.6], center=true);
                                                    }
                                                  }
                                                  union () {
                                                    translate ([0.5, 5, -3.12]) {
                                                      cube ([11.7, 4.5, 1.5], center=true);
                                                    }
                                                    translate ([4.2, 2.8, -3.12]) {
                                                      cube ([4, 4.5, 1.5], center=true);
                                                    }
                                                  }
                                                  translate ([-6.3, 5.5, -3.5]) {
                                                    rotate (a=10.0, v=[1, 0, 0]) {
                                                      cube ([2, 2, 10], center=true);
                                                    }
                                                  }
                                                  translate ([7.3, 3.5, -3.5]) {
                                                    rotate (a=10.0, v=[-1, 0, 0]) {
                                                      cube ([2, 2, 10], center=true);
                                                    }
                                                  }
                                                  translate ([8.1, 9.1, -3.5]) {
                                                    rotate (a=22.5, v=[1, -1, 0]) {
                                                      rotate (a=45.0, v=[0, 0, 1]) {
                                                        cube ([4, 4, 10], center=true);
                                                      }
                                                    }
                                                  }
                                                }
                                              }
                                            }
                                          }
                                        }
                                      }
                                    }
                                  }
                                }
                              }
                            }
                          }
                        }
                      }
                    }
                  }
                  translate ([-52, -53, 40]) {
                    rotate (a=7.499999999999999, v=[1, -0.1, 0]) {
                      rotate (a=16.875, v=[0, 0, 1]) {
                        translate ([17.4, 0, 0]) {
                          translate ([0, 0.8, 1597.5641385291783]) {
                            rotate (a=1.40625, v=[0, 1, 0]) {
                              translate ([0, 0, -1597.5641385291783]) {
                                translate ([0, 0, 1516.0762963369527]) {
                                  rotate (a=0.703125, v=[1, 0, 0]) {
                                    translate ([0, 0, -1516.0762963369527]) {
                                      rotate (a=90.0, v=[0, 0, 1]) {
                                        union () {
                                          difference () {
                                            union () {
                                              translate ([1.7, 5.75, -3.5]) {
                                                cube ([11, 5, 2], center=true);
                                              }
                                              translate ([-3.7, 3.15, -3.5]) {
                                                cube ([5, 3, 2], center=true);
                                              }
                                              translate ([4.2, 2.2, -3.8]) {
                                                cube ([4, 5, 1.6], center=true);
                                              }
                                            }
                                            union () {
                                              translate ([0.5, 5, -3.12]) {
                                                cube ([11.7, 4.5, 1.5], center=true);
                                              }
                                              translate ([4.2, 2.8, -3.12]) {
                                                cube ([4, 4.5, 1.5], center=true);
                                              }
                                            }
                                            translate ([-6.3, 5.5, -3.5]) {
                                              rotate (a=10.0, v=[1, 0, 0]) {
                                                cube ([2, 2, 10], center=true);
                                              }
                                            }
                                            translate ([7.3, 3.5, -3.5]) {
                                              rotate (a=10.0, v=[-1, 0, 0]) {
                                                cube ([2, 2, 10], center=true);
                                              }
                                            }
                                            translate ([8.1, 9.1, -3.5]) {
                                              rotate (a=22.5, v=[1, -1, 0]) {
                                                rotate (a=45.0, v=[0, 0, 1]) {
                                                  cube ([4, 4, 10], center=true);
                                                }
                                              }
                                            }
                                          }
                                          translate ([0, 0, -54.5]) {
                                            linear_extrude (height=100, center=true){
                                              projection (cut = false) {
                                                difference () {
                                                  union () {
                                                    translate ([1.7, 5.75, -3.5]) {
                                                      cube ([11, 5, 2], center=true);
                                                    }
                                                    translate ([-3.7, 3.15, -3.5]) {
                                                      cube ([5, 3, 2], center=true);
                                                    }
                                                    translate ([4.2, 2.2, -3.8]) {
                                                      cube ([4, 5, 1.6], center=true);
                                                    }
                                                  }
                                                  union () {
                                                    translate ([0.5, 5, -3.12]) {
                                                      cube ([11.7, 4.5, 1.5], center=true);
                                                    }
                                                    translate ([4.2, 2.8, -3.12]) {
                                                      cube ([4, 4.5, 1.5], center=true);
                                                    }
                                                  }
                                                  translate ([-6.3, 5.5, -3.5]) {
                                                    rotate (a=10.0, v=[1, 0, 0]) {
                                                      cube ([2, 2, 10], center=true);
                                                    }
                                                  }
                                                  translate ([7.3, 3.5, -3.5]) {
                                                    rotate (a=10.0, v=[-1, 0, 0]) {
                                                      cube ([2, 2, 10], center=true);
                                                    }
                                                  }
                                                  translate ([8.1, 9.1, -3.5]) {
                                                    rotate (a=22.5, v=[1, -1, 0]) {
                                                      rotate (a=45.0, v=[0, 0, 1]) {
                                                        cube ([4, 4, 10], center=true);
                                                      }
                                                    }
                                                  }
                                                }
                                              }
                                            }
                                          }
                                        }
                                      }
                                    }
                                  }
                                }
                              }
                            }
                          }
                        }
                      }
                    }
                  }
                }
              }
            }
          }
        }
        translate ([48, 115, 8]) {
          rotate (a=17.142857142857142, v=[-1, 0, -1]) {
            cube ([2, 40, 35], center=true);
          }
        }
        translate ([66, 105, 8]) {
          rotate (a=17.142857142857142, v=[-1, 0, -1]) {
            cube ([2, 28, 35], center=true);
          }
        }
        translate ([68, 115, 8]) {
          rotate (a=17.142857142857142, v=[-1, 0, -1]) {
            cube ([40, 2, 35], center=true);
          }
        }
        translate ([57, 87, 10]) {
          rotate (a=17.142857142857142, v=[-1, 0, -1]) {
            cube ([30, 2, 40], center=true);
          }
        }
        translate ([94, 105, 2]) {
          rotate (a=17.142857142857142, v=[-1, 0, -1]) {
            cube ([20, 2, 30], center=true);
          }
        }
        translate ([85, 97, 8]) {
          rotate (a=18.0, v=[0.5, 1, 0]) {
            cube ([2, 34, 30], center=true);
          }
        }
      }
      translate ([0, 0, 0.4]) {
        union () {
          difference () {
            translate ([0, 63, 89]) {
              rotate (a=90.0, v=[0, 1, 0]) {
                cylinder ($fn=50, h=416, r=91, center=true);
              }
            }
            intersection () {
              difference () {
                translate ([0, 63, 89]) {
                  rotate (a=90.0, v=[0, 1, 0]) {
                    cylinder ($fn=50, h=416, r=91, center=true);
                  }
                }
                translate ([0, 63, 89]) {
                  rotate (a=90.0, v=[0, 1, 0]) {
                    cylinder ($fn=50, h=416, r=90, center=true);
                  }
                }
              }
              translate ([195.25, 6, 22]) {
                cube ([26, 18, 31], center=true);
              }
            }
            translate ([0, 16, -70]) {
              rotate (a=90.0, v=[1, 0, 0]) {
                cylinder ($fn=50, h=32, r=112, center=true);
              }
            }
            translate ([203, 8, 9.8]) {
              cylinder (h=25, r=5.8, center=true);
            }
            translate ([0, 93, 0.5]) {
              cube ([416, 186, 2], center=true);
            }
            translate ([0, 1, 35]) {
              cube ([416, 2, 70], center=true);
            }
          }
          translate ([0, 130, 25.4]) {
            rotate (a=8.181818181818182, v=[1, 0, 0]) {
              cube ([416, 110, 30], center=true);
            }
          }
        }
      }
    }
  }
  translate ([100, 100, -97.1]) {
    cube ([700, 300, 200], center=true);
  }
}
